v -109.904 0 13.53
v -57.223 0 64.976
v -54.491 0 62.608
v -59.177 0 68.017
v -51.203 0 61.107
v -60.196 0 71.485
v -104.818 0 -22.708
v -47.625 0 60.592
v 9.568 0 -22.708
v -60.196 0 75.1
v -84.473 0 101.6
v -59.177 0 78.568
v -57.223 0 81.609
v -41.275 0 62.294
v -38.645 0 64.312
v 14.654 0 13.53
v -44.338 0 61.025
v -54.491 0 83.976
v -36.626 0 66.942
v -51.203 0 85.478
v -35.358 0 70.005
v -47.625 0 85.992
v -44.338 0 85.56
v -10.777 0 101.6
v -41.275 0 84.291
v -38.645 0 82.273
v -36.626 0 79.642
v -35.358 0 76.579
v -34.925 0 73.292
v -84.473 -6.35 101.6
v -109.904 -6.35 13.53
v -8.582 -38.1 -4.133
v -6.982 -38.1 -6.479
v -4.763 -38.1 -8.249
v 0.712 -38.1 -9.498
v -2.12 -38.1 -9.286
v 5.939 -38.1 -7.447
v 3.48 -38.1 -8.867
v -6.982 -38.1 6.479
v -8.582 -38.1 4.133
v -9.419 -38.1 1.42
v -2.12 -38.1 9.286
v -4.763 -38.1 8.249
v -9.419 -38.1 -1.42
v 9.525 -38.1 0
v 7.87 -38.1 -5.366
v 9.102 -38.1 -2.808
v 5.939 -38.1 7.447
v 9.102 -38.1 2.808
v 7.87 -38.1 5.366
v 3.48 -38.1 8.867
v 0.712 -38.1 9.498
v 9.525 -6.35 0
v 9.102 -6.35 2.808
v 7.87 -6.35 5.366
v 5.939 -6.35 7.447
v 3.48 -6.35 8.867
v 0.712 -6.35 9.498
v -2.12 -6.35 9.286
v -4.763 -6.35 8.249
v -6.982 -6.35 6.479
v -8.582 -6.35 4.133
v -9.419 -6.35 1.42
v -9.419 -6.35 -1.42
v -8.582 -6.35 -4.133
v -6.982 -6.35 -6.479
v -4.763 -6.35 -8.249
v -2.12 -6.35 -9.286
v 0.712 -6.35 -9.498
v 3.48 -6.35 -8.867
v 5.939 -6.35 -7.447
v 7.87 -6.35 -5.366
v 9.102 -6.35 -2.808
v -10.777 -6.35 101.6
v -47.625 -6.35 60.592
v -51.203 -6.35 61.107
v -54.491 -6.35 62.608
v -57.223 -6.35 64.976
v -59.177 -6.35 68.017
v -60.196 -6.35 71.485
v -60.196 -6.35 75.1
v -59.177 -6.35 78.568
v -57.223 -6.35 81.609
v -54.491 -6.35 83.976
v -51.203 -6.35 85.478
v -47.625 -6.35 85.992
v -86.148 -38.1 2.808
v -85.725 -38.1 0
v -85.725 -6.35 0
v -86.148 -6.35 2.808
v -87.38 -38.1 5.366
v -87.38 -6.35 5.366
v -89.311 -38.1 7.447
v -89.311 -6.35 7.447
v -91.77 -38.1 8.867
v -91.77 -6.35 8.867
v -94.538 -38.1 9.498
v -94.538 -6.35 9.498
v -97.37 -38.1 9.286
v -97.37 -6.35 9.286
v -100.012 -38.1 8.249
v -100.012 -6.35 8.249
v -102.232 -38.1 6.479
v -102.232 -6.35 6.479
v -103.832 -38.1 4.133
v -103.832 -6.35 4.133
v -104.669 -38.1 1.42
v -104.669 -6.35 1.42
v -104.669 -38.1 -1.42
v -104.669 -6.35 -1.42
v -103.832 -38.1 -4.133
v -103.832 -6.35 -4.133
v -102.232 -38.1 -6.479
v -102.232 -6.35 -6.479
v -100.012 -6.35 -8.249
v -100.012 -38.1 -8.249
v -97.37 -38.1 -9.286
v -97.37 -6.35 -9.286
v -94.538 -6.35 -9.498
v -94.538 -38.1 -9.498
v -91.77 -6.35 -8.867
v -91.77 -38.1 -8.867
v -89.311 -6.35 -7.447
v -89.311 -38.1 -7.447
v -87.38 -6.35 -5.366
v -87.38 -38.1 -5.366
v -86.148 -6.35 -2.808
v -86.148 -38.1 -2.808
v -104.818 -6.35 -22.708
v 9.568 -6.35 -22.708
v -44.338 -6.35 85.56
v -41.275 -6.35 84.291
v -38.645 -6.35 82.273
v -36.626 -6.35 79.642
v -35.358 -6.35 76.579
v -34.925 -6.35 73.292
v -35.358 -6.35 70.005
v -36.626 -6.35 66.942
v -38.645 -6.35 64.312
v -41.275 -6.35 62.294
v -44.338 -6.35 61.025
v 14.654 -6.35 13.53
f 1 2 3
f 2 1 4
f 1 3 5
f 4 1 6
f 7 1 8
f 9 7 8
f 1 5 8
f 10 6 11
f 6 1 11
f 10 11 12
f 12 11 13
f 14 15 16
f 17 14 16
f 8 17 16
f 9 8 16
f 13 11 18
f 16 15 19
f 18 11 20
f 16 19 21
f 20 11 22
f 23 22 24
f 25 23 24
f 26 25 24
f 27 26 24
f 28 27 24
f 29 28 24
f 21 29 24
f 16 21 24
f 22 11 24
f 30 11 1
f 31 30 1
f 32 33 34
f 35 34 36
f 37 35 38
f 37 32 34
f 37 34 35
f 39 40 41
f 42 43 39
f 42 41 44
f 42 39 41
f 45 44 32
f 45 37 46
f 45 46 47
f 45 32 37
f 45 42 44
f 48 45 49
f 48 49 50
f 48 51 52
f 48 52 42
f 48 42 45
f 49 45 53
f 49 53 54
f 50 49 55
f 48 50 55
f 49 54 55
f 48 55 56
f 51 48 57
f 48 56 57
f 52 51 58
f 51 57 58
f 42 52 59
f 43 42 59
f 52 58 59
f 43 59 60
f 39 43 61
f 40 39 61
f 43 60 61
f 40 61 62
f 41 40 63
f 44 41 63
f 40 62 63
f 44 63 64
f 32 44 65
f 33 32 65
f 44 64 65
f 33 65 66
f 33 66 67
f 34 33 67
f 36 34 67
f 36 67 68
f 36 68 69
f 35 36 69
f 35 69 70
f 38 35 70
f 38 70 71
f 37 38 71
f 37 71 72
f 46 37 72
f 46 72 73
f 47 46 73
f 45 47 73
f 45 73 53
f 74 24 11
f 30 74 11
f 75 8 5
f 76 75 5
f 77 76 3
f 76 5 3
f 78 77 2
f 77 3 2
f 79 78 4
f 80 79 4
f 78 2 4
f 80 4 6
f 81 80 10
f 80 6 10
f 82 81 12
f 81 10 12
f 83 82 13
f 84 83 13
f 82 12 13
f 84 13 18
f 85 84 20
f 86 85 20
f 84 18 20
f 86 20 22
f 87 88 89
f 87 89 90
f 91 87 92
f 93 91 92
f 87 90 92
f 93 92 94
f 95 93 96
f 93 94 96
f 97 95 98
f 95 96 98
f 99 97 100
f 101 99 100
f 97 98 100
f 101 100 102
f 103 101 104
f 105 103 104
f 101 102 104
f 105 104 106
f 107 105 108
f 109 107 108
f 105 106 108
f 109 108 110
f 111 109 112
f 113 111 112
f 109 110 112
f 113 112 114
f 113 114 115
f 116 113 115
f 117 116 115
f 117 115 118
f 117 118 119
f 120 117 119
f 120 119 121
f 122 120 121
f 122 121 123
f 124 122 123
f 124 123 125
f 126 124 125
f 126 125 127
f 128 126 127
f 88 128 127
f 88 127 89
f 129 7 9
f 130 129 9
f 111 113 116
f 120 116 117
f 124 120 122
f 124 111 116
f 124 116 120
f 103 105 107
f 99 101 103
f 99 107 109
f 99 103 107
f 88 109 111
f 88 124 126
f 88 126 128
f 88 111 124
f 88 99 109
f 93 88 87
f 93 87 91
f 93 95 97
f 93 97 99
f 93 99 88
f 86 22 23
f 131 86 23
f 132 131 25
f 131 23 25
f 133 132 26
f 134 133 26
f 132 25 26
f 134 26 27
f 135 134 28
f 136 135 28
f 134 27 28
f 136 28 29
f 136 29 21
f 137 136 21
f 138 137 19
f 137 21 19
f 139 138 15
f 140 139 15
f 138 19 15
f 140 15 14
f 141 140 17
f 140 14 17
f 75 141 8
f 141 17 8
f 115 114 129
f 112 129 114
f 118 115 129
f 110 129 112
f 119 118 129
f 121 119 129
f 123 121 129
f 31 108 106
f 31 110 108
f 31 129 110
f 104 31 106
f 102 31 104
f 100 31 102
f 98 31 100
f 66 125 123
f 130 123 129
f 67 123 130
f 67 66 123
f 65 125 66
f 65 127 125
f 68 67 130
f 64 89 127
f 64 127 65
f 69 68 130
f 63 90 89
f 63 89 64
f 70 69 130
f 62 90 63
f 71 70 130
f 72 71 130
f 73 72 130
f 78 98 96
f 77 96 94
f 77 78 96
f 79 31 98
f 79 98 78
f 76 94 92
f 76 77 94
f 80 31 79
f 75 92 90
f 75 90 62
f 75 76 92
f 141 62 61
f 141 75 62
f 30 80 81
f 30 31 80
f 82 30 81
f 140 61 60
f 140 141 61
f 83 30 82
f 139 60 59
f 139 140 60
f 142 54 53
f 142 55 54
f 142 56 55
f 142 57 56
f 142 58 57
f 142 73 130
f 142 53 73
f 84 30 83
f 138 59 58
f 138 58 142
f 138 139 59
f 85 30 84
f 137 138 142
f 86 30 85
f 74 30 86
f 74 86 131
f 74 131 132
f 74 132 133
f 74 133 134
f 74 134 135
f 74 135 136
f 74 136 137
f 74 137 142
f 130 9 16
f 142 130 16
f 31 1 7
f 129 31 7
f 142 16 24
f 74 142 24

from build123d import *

# Parameters (mm, degrees)
F0_R     = 9.525
F1_DEPTH = 6.35
F2_DEPTH = 38.1


with BuildPart() as f1:
    # F0 (on Front) → F1 (new body)
    with BuildSketch(Plane.XZ):
        Polygon((-10.77674, 101.6), (-47.625, 101.6), (-84.47326, 101.6), (-109.903924, 13.530285), (-104.817793, -22.708416), (9.567793, -22.708416), (14.653924, 13.530285), align=None)
        with Locations((-95.25, 0)):
            Circle(F0_R, mode=Mode.SUBTRACT)
        Circle(F0_R, mode=Mode.SUBTRACT)
        with BuildLine():
            ThreePointArc((-34.925, 73.292352), (-38.644744, 64.312096), (-47.625, 60.592352))
            ThreePointArc((-47.625, 60.592352), (-60.325, 73.292352), (-47.625, 85.992352))
            ThreePointArc((-47.625, 85.992352), (-38.644744, 82.272608), (-34.925, 73.292352))
        make_face(mode=Mode.SUBTRACT)
    extrude(amount=F1_DEPTH)

    # F0 (on Front) → F2 (join)
    with BuildSketch(Plane.XZ):
        with Locations((-95.25, 0)):
            Circle(F0_R)
        Circle(F0_R)
    extrude(amount=F2_DEPTH)


solid = f1.part
